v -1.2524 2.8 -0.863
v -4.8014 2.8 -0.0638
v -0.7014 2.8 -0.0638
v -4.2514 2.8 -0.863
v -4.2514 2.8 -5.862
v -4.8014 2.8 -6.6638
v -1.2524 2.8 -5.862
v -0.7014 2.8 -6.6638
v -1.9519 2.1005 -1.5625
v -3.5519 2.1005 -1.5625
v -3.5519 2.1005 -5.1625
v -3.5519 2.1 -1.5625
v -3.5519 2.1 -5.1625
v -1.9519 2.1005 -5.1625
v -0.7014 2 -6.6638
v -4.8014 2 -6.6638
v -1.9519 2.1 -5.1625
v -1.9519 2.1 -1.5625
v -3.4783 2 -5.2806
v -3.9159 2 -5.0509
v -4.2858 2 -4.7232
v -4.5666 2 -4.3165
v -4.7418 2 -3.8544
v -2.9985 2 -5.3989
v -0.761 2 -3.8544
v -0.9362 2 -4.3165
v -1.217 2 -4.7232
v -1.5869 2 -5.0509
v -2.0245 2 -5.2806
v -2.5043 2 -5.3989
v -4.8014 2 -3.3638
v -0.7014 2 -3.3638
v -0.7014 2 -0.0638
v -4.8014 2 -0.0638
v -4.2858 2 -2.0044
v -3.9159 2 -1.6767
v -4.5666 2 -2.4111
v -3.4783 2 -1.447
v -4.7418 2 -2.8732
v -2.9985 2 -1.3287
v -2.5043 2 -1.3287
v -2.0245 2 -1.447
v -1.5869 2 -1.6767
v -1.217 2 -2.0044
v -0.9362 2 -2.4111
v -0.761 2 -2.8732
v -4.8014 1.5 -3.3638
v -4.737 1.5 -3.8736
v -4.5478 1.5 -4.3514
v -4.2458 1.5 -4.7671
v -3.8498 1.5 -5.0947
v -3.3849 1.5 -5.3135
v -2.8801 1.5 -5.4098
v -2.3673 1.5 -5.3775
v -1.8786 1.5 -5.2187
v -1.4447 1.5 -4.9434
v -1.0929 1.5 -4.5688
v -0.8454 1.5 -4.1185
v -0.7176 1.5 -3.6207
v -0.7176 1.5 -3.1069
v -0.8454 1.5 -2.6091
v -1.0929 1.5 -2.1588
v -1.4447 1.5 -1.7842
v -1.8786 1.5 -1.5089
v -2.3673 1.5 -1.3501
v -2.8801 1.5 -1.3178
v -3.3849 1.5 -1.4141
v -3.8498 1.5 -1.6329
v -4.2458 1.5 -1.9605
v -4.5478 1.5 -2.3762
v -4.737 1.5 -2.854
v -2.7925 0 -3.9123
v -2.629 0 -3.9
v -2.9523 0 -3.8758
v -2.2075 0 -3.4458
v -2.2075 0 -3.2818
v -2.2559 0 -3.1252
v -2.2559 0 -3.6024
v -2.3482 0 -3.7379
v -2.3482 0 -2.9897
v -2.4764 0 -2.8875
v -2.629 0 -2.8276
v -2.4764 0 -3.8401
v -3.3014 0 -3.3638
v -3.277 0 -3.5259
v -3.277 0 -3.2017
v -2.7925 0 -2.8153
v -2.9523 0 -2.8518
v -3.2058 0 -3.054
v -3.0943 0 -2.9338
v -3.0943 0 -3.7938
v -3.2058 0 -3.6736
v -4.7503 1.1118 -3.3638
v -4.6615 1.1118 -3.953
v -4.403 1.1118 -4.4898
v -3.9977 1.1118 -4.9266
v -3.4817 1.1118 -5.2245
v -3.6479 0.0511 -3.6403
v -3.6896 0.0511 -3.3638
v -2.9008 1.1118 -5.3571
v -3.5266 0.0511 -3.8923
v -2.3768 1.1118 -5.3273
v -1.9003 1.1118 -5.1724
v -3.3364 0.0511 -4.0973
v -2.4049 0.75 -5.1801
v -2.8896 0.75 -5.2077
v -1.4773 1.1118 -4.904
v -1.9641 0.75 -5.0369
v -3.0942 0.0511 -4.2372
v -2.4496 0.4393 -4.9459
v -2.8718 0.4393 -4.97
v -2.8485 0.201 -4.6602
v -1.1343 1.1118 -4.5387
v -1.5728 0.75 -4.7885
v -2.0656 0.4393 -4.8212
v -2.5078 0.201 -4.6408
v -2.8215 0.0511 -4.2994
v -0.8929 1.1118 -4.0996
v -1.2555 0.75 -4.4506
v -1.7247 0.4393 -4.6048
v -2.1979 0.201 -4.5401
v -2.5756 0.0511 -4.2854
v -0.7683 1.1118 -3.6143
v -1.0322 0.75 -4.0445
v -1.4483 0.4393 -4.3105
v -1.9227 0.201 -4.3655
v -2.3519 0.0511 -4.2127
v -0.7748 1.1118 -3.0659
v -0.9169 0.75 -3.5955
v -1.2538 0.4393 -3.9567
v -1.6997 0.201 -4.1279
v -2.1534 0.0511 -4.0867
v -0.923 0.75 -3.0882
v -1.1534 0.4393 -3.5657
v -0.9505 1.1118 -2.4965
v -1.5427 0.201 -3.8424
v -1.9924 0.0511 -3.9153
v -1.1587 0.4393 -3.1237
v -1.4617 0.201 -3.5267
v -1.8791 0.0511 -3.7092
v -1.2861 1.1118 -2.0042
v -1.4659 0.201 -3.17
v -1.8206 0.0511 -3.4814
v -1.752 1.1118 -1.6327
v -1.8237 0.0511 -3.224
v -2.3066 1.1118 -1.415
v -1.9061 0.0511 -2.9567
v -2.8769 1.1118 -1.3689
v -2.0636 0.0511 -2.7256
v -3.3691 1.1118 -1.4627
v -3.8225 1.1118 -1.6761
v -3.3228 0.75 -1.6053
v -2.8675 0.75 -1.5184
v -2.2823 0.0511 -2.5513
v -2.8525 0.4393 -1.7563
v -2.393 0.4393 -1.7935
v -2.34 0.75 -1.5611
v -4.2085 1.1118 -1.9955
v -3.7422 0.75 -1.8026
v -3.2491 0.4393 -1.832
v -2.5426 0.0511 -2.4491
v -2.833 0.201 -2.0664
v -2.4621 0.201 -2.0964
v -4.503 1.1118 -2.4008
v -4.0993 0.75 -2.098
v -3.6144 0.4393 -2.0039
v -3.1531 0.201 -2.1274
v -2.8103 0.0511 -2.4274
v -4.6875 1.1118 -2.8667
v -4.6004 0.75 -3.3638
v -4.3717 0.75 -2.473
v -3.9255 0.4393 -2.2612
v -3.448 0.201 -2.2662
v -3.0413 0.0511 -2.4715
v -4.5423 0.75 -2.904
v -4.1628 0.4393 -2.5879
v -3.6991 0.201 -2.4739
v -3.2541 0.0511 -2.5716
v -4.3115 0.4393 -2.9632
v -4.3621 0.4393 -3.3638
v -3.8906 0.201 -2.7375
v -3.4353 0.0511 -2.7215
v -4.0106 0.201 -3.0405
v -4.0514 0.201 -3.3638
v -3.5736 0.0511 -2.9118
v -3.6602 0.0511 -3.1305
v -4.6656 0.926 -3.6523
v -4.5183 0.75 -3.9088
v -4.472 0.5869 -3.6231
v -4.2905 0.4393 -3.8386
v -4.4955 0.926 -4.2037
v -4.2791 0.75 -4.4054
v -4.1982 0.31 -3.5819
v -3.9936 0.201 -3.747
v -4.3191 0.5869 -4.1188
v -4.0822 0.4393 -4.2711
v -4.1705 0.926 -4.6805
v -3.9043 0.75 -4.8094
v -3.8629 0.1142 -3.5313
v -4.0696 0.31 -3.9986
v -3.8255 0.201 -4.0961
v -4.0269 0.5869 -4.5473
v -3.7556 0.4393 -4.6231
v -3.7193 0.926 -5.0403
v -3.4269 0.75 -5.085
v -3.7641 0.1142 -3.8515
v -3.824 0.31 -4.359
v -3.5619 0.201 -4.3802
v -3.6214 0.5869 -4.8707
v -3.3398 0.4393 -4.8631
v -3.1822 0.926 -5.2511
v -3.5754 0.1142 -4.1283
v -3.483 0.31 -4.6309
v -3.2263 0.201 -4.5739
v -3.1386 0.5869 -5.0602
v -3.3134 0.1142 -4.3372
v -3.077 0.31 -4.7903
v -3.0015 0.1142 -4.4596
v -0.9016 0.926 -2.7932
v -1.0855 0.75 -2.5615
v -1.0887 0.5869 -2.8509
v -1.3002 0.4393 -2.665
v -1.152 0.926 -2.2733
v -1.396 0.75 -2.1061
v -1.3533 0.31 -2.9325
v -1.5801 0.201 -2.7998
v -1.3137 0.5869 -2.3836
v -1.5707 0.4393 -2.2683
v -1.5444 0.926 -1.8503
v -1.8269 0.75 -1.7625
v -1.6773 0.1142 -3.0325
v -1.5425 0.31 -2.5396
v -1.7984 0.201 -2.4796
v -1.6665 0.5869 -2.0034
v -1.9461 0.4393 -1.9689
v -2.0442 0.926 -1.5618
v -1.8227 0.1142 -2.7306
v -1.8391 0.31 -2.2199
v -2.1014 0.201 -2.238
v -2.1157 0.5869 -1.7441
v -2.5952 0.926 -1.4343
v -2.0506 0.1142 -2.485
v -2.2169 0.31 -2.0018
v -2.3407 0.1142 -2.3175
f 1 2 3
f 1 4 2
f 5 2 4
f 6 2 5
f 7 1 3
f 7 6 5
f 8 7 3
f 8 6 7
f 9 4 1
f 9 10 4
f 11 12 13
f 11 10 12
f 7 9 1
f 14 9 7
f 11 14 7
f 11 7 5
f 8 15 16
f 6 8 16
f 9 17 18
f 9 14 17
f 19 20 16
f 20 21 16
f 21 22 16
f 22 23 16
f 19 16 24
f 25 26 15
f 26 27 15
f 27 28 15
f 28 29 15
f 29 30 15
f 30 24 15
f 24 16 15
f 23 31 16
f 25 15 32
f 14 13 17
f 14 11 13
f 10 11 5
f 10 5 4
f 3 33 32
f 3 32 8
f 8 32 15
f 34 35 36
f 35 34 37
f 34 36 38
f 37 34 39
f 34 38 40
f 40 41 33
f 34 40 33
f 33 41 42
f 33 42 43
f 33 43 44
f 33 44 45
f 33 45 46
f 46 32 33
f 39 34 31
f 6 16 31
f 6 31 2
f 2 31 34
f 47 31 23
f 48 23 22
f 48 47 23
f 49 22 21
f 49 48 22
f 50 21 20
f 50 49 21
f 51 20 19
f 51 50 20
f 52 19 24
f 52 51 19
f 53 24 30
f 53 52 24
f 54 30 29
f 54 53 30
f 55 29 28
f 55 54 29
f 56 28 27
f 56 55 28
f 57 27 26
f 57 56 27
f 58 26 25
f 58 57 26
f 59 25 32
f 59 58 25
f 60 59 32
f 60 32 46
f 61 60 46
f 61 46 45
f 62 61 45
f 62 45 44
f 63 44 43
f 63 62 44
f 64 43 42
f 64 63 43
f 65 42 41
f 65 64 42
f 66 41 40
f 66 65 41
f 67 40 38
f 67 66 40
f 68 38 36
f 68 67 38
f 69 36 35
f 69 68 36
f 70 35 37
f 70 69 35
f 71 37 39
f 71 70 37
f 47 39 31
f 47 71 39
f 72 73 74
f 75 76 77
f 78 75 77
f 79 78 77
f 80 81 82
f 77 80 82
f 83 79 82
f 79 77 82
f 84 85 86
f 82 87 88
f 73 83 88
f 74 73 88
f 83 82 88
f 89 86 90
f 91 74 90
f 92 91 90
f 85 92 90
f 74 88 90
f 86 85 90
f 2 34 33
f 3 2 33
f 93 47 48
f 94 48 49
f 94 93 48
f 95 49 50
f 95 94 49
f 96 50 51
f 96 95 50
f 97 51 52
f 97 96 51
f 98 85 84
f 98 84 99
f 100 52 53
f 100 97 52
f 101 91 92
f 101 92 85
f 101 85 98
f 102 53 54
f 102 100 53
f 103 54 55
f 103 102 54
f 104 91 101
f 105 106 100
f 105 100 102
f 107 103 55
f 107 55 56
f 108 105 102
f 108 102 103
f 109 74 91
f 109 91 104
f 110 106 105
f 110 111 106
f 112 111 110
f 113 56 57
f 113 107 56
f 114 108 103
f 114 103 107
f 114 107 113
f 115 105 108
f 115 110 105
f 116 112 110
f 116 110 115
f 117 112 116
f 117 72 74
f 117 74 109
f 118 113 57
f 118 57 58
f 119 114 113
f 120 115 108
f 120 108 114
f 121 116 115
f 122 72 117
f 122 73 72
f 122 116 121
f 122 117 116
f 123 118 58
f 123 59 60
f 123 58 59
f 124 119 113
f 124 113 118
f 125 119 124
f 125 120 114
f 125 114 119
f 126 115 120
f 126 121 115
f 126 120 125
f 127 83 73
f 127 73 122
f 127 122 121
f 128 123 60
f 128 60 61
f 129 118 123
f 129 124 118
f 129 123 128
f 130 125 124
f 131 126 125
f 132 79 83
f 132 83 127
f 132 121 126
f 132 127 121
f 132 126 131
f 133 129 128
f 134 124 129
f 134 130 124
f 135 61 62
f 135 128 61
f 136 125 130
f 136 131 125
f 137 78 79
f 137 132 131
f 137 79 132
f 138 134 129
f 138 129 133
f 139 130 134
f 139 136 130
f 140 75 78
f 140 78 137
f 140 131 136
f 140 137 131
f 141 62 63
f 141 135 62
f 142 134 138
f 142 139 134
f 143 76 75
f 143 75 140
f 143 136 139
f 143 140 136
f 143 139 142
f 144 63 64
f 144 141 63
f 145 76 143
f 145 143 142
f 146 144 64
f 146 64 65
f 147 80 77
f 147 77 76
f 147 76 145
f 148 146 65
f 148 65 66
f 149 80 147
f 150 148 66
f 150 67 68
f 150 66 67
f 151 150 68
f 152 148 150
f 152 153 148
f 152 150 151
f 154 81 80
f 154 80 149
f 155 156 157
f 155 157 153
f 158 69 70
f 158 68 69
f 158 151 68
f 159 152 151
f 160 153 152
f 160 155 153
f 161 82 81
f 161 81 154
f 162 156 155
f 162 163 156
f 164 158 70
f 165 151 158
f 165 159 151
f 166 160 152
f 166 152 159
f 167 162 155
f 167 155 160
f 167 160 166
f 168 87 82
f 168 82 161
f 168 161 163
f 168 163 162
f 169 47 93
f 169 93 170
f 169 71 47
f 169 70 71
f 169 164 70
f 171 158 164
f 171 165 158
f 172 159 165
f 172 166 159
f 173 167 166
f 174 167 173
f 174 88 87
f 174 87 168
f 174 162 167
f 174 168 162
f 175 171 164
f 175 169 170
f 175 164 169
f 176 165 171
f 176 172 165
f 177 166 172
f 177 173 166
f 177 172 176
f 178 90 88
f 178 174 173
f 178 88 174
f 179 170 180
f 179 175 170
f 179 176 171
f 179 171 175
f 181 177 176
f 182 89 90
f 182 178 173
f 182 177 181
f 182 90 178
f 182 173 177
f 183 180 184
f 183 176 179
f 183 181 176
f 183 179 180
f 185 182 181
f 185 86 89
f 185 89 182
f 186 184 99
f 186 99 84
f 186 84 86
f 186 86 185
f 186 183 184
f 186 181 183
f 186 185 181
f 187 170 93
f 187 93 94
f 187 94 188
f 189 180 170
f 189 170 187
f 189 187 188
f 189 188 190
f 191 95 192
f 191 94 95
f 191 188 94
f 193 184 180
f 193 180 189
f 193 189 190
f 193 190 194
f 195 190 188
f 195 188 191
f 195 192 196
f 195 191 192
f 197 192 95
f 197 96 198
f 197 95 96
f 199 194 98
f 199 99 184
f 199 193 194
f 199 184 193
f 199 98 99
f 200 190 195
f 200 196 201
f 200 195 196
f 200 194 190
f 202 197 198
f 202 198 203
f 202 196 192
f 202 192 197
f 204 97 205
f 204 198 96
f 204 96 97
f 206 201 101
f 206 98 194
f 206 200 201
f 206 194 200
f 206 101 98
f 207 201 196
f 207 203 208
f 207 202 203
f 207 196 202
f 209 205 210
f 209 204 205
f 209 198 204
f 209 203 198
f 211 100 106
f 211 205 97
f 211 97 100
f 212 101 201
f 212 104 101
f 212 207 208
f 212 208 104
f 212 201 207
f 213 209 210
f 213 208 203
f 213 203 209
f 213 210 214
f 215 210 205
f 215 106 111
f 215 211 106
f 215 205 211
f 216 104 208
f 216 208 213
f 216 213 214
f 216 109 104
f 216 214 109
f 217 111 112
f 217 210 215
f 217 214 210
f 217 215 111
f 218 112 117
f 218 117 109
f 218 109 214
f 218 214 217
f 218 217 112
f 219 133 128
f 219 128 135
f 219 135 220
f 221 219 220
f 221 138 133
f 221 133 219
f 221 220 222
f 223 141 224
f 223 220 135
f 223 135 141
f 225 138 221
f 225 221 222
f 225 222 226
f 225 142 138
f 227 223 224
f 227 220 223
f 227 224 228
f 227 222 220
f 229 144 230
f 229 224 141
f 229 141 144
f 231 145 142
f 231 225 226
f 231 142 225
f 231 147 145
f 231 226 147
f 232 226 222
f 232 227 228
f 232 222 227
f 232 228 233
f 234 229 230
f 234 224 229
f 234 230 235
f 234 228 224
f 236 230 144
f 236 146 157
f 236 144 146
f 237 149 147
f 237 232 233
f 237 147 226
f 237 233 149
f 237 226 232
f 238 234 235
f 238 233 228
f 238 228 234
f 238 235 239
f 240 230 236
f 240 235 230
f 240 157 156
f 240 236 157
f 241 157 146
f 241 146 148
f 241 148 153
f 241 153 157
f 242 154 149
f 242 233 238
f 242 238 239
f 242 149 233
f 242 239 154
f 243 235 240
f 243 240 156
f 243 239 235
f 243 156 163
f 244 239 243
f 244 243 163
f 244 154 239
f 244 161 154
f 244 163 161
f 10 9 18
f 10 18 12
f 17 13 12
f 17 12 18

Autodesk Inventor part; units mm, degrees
ref_plane "YZ Plane" through (0, 0, 0) normal (1, 0, 0) x (0, 1, 0)
ref_plane "XZ Plane" through (0, 0, 0) normal (0, 1, 0) x (-1, 0, 0)
ref_plane "XY Plane" through (0, 0, 0) normal (0, 0, 1) x (1, 0, 0)
sketch "Skizze1" plane through (0, 0, 0) normal (0, 1, 0) x (-1, 0, 0)
  circle A0 centre (2.7514, -3.3638) radius 2.05
  point P0 (0, 0)
  dimension "d0" = 4.1
extrude "Extrusion1" add sketch "Skizze1" along normal blind 2
fillet "Rundung1" radius 1.5 1 edges at (-0.7014, 0, -3.3638)
sketch "Skizze9" plane through (-2.7514, 2, -3.3638) normal (0, 1, 0) x (1, 0, 0)
  point P0 (2.7514, -3.3638)
sketch "Skizze10" plane through (-2.7514, 2, -3.3638) normal (0, 1, 0) x (1, 0, 0)
  line L0 (0, 0) -> (2.05, 0)
  line L1 (2.05, 0) -> (2.05, 3.3)
  line L2 (2.05, 3.3) -> (0, 3.3)
  line L3 (0, 3.3) -> (0, 0)
  line L4 (2.05, 3.3) -> (-2.05, 3.3)
  line L5 (-2.05, 3.3) -> (-2.05, -3.3)
  line L6 (-2.05, -3.3) -> (2.05, -3.3)
  line L7 (2.05, -3.3) -> (2.05, 3.3)
  point P0 (2.7514, -3.3638)
  point P1 (0, 3.3)
  dimension "d27" = 3.3
  dimension "d28" = 6.6
extrude "Extrusion9" add sketch "Skizze10" along normal blind 0.8
sketch "Skizze12" plane through (-2.7514, 2.8, -3.3638) normal (0, 1, 0) x (1, 0, 0)
  line L0 (-0.0005, -0.0013) -> (-0.8005, -0.0013)
  line L1 (-0.8005, -0.0013) -> (-0.8005, 1.7987)
  line L2 (-0.8005, 1.7987) -> (-0.0005, 1.7987)
  line L3 (-0.0005, 1.7987) -> (-0.0005, -0.0013)
  line L4 (-0.8005, 1.7987) -> (0.7995, 1.7987)
  line L5 (0.7995, 1.7987) -> (0.7995, -1.8013)
  line L6 (0.7995, -1.8013) -> (-0.8005, -1.8013)
  line L7 (-0.8005, -1.8013) -> (-0.8005, 1.7987)
  point P0 (2.7514, -3.3638)
  dimension "d35" = 0.8
  dimension "d36" = 1.8
  dimension "d37" = 1.6
  dimension "d38" = 3.6
extrude "Extrusion10" cut sketch "Skizze12" against normal blind 0.7
chamfer "Fase1" distance 0.7 angle 45 4 edges at (-1.9519, 2.8, -3.3625) (-3.5519, 2.8, -3.3625) (-2.7519, 2.8, -5.1625) (-2.7519, 2.8, -1.5625)
properties part number "button" material "Gummi, Silikon"
